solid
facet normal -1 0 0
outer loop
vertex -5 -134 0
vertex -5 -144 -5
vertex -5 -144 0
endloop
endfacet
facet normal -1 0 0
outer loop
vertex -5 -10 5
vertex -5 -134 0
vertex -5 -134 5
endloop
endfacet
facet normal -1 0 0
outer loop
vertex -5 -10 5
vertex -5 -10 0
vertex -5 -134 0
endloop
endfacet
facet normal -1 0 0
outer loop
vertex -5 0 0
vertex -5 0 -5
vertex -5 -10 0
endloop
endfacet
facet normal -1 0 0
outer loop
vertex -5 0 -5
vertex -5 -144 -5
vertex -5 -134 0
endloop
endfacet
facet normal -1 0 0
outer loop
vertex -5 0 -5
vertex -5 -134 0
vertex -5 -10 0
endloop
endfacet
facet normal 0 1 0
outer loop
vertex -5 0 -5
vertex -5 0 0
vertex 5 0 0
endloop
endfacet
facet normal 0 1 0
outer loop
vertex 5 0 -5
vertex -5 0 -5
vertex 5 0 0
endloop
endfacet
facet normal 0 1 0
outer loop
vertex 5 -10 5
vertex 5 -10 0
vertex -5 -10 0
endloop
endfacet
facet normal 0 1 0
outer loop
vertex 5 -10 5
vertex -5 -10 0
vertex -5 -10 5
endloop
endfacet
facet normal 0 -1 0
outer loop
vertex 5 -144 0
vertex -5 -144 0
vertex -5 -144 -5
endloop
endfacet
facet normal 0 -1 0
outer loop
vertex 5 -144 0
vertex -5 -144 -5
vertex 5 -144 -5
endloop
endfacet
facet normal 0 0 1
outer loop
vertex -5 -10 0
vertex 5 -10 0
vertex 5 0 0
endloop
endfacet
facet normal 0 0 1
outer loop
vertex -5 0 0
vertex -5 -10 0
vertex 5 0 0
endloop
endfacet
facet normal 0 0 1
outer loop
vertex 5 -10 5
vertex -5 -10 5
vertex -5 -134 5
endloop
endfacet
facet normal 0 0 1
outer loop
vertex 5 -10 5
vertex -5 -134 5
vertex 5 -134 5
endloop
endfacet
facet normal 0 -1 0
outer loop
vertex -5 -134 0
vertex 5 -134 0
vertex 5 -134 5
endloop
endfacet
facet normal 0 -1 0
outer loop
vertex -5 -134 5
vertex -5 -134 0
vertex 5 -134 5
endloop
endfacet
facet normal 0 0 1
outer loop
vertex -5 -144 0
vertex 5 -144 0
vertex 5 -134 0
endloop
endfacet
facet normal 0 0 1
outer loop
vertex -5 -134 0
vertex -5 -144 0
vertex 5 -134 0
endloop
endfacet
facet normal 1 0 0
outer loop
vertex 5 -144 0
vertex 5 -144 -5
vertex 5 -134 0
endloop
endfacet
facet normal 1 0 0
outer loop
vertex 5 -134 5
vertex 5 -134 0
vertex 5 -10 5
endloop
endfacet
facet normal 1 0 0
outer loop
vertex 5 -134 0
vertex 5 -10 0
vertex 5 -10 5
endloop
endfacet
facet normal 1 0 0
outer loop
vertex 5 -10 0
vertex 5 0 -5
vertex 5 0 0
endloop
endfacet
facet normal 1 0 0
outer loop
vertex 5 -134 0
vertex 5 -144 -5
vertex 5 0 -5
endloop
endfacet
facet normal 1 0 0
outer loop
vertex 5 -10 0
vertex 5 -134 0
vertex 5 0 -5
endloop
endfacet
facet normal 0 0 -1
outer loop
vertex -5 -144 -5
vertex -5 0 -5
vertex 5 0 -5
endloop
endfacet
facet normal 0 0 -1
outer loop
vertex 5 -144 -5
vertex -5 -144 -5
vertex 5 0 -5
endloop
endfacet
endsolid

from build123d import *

# Parameters (mm, degrees)
F0_W     = 10
F0_H     = 10
F1_DEPTH = 144
F2_W     = 10
F2_H     = 5
F3_DEPTH = 10


with BuildPart() as f1:
    # F0 (on Front) → F1 (new body)
    with BuildSketch(Plane.XZ):
        Rectangle(F0_W, F0_H)
    extrude(amount=F1_DEPTH)

    # F2 (on face) → F3 (cut)
    with BuildSketch(Plane.YZ.offset(5)):
        with Locations((-139, 2.5)):
            Rectangle(F2_W, F2_H)
        with Locations((-5, 2.5)):
            Rectangle(F2_W, F2_H)
    extrude(amount=-F3_DEPTH, mode=Mode.SUBTRACT)


solid = f1.part
